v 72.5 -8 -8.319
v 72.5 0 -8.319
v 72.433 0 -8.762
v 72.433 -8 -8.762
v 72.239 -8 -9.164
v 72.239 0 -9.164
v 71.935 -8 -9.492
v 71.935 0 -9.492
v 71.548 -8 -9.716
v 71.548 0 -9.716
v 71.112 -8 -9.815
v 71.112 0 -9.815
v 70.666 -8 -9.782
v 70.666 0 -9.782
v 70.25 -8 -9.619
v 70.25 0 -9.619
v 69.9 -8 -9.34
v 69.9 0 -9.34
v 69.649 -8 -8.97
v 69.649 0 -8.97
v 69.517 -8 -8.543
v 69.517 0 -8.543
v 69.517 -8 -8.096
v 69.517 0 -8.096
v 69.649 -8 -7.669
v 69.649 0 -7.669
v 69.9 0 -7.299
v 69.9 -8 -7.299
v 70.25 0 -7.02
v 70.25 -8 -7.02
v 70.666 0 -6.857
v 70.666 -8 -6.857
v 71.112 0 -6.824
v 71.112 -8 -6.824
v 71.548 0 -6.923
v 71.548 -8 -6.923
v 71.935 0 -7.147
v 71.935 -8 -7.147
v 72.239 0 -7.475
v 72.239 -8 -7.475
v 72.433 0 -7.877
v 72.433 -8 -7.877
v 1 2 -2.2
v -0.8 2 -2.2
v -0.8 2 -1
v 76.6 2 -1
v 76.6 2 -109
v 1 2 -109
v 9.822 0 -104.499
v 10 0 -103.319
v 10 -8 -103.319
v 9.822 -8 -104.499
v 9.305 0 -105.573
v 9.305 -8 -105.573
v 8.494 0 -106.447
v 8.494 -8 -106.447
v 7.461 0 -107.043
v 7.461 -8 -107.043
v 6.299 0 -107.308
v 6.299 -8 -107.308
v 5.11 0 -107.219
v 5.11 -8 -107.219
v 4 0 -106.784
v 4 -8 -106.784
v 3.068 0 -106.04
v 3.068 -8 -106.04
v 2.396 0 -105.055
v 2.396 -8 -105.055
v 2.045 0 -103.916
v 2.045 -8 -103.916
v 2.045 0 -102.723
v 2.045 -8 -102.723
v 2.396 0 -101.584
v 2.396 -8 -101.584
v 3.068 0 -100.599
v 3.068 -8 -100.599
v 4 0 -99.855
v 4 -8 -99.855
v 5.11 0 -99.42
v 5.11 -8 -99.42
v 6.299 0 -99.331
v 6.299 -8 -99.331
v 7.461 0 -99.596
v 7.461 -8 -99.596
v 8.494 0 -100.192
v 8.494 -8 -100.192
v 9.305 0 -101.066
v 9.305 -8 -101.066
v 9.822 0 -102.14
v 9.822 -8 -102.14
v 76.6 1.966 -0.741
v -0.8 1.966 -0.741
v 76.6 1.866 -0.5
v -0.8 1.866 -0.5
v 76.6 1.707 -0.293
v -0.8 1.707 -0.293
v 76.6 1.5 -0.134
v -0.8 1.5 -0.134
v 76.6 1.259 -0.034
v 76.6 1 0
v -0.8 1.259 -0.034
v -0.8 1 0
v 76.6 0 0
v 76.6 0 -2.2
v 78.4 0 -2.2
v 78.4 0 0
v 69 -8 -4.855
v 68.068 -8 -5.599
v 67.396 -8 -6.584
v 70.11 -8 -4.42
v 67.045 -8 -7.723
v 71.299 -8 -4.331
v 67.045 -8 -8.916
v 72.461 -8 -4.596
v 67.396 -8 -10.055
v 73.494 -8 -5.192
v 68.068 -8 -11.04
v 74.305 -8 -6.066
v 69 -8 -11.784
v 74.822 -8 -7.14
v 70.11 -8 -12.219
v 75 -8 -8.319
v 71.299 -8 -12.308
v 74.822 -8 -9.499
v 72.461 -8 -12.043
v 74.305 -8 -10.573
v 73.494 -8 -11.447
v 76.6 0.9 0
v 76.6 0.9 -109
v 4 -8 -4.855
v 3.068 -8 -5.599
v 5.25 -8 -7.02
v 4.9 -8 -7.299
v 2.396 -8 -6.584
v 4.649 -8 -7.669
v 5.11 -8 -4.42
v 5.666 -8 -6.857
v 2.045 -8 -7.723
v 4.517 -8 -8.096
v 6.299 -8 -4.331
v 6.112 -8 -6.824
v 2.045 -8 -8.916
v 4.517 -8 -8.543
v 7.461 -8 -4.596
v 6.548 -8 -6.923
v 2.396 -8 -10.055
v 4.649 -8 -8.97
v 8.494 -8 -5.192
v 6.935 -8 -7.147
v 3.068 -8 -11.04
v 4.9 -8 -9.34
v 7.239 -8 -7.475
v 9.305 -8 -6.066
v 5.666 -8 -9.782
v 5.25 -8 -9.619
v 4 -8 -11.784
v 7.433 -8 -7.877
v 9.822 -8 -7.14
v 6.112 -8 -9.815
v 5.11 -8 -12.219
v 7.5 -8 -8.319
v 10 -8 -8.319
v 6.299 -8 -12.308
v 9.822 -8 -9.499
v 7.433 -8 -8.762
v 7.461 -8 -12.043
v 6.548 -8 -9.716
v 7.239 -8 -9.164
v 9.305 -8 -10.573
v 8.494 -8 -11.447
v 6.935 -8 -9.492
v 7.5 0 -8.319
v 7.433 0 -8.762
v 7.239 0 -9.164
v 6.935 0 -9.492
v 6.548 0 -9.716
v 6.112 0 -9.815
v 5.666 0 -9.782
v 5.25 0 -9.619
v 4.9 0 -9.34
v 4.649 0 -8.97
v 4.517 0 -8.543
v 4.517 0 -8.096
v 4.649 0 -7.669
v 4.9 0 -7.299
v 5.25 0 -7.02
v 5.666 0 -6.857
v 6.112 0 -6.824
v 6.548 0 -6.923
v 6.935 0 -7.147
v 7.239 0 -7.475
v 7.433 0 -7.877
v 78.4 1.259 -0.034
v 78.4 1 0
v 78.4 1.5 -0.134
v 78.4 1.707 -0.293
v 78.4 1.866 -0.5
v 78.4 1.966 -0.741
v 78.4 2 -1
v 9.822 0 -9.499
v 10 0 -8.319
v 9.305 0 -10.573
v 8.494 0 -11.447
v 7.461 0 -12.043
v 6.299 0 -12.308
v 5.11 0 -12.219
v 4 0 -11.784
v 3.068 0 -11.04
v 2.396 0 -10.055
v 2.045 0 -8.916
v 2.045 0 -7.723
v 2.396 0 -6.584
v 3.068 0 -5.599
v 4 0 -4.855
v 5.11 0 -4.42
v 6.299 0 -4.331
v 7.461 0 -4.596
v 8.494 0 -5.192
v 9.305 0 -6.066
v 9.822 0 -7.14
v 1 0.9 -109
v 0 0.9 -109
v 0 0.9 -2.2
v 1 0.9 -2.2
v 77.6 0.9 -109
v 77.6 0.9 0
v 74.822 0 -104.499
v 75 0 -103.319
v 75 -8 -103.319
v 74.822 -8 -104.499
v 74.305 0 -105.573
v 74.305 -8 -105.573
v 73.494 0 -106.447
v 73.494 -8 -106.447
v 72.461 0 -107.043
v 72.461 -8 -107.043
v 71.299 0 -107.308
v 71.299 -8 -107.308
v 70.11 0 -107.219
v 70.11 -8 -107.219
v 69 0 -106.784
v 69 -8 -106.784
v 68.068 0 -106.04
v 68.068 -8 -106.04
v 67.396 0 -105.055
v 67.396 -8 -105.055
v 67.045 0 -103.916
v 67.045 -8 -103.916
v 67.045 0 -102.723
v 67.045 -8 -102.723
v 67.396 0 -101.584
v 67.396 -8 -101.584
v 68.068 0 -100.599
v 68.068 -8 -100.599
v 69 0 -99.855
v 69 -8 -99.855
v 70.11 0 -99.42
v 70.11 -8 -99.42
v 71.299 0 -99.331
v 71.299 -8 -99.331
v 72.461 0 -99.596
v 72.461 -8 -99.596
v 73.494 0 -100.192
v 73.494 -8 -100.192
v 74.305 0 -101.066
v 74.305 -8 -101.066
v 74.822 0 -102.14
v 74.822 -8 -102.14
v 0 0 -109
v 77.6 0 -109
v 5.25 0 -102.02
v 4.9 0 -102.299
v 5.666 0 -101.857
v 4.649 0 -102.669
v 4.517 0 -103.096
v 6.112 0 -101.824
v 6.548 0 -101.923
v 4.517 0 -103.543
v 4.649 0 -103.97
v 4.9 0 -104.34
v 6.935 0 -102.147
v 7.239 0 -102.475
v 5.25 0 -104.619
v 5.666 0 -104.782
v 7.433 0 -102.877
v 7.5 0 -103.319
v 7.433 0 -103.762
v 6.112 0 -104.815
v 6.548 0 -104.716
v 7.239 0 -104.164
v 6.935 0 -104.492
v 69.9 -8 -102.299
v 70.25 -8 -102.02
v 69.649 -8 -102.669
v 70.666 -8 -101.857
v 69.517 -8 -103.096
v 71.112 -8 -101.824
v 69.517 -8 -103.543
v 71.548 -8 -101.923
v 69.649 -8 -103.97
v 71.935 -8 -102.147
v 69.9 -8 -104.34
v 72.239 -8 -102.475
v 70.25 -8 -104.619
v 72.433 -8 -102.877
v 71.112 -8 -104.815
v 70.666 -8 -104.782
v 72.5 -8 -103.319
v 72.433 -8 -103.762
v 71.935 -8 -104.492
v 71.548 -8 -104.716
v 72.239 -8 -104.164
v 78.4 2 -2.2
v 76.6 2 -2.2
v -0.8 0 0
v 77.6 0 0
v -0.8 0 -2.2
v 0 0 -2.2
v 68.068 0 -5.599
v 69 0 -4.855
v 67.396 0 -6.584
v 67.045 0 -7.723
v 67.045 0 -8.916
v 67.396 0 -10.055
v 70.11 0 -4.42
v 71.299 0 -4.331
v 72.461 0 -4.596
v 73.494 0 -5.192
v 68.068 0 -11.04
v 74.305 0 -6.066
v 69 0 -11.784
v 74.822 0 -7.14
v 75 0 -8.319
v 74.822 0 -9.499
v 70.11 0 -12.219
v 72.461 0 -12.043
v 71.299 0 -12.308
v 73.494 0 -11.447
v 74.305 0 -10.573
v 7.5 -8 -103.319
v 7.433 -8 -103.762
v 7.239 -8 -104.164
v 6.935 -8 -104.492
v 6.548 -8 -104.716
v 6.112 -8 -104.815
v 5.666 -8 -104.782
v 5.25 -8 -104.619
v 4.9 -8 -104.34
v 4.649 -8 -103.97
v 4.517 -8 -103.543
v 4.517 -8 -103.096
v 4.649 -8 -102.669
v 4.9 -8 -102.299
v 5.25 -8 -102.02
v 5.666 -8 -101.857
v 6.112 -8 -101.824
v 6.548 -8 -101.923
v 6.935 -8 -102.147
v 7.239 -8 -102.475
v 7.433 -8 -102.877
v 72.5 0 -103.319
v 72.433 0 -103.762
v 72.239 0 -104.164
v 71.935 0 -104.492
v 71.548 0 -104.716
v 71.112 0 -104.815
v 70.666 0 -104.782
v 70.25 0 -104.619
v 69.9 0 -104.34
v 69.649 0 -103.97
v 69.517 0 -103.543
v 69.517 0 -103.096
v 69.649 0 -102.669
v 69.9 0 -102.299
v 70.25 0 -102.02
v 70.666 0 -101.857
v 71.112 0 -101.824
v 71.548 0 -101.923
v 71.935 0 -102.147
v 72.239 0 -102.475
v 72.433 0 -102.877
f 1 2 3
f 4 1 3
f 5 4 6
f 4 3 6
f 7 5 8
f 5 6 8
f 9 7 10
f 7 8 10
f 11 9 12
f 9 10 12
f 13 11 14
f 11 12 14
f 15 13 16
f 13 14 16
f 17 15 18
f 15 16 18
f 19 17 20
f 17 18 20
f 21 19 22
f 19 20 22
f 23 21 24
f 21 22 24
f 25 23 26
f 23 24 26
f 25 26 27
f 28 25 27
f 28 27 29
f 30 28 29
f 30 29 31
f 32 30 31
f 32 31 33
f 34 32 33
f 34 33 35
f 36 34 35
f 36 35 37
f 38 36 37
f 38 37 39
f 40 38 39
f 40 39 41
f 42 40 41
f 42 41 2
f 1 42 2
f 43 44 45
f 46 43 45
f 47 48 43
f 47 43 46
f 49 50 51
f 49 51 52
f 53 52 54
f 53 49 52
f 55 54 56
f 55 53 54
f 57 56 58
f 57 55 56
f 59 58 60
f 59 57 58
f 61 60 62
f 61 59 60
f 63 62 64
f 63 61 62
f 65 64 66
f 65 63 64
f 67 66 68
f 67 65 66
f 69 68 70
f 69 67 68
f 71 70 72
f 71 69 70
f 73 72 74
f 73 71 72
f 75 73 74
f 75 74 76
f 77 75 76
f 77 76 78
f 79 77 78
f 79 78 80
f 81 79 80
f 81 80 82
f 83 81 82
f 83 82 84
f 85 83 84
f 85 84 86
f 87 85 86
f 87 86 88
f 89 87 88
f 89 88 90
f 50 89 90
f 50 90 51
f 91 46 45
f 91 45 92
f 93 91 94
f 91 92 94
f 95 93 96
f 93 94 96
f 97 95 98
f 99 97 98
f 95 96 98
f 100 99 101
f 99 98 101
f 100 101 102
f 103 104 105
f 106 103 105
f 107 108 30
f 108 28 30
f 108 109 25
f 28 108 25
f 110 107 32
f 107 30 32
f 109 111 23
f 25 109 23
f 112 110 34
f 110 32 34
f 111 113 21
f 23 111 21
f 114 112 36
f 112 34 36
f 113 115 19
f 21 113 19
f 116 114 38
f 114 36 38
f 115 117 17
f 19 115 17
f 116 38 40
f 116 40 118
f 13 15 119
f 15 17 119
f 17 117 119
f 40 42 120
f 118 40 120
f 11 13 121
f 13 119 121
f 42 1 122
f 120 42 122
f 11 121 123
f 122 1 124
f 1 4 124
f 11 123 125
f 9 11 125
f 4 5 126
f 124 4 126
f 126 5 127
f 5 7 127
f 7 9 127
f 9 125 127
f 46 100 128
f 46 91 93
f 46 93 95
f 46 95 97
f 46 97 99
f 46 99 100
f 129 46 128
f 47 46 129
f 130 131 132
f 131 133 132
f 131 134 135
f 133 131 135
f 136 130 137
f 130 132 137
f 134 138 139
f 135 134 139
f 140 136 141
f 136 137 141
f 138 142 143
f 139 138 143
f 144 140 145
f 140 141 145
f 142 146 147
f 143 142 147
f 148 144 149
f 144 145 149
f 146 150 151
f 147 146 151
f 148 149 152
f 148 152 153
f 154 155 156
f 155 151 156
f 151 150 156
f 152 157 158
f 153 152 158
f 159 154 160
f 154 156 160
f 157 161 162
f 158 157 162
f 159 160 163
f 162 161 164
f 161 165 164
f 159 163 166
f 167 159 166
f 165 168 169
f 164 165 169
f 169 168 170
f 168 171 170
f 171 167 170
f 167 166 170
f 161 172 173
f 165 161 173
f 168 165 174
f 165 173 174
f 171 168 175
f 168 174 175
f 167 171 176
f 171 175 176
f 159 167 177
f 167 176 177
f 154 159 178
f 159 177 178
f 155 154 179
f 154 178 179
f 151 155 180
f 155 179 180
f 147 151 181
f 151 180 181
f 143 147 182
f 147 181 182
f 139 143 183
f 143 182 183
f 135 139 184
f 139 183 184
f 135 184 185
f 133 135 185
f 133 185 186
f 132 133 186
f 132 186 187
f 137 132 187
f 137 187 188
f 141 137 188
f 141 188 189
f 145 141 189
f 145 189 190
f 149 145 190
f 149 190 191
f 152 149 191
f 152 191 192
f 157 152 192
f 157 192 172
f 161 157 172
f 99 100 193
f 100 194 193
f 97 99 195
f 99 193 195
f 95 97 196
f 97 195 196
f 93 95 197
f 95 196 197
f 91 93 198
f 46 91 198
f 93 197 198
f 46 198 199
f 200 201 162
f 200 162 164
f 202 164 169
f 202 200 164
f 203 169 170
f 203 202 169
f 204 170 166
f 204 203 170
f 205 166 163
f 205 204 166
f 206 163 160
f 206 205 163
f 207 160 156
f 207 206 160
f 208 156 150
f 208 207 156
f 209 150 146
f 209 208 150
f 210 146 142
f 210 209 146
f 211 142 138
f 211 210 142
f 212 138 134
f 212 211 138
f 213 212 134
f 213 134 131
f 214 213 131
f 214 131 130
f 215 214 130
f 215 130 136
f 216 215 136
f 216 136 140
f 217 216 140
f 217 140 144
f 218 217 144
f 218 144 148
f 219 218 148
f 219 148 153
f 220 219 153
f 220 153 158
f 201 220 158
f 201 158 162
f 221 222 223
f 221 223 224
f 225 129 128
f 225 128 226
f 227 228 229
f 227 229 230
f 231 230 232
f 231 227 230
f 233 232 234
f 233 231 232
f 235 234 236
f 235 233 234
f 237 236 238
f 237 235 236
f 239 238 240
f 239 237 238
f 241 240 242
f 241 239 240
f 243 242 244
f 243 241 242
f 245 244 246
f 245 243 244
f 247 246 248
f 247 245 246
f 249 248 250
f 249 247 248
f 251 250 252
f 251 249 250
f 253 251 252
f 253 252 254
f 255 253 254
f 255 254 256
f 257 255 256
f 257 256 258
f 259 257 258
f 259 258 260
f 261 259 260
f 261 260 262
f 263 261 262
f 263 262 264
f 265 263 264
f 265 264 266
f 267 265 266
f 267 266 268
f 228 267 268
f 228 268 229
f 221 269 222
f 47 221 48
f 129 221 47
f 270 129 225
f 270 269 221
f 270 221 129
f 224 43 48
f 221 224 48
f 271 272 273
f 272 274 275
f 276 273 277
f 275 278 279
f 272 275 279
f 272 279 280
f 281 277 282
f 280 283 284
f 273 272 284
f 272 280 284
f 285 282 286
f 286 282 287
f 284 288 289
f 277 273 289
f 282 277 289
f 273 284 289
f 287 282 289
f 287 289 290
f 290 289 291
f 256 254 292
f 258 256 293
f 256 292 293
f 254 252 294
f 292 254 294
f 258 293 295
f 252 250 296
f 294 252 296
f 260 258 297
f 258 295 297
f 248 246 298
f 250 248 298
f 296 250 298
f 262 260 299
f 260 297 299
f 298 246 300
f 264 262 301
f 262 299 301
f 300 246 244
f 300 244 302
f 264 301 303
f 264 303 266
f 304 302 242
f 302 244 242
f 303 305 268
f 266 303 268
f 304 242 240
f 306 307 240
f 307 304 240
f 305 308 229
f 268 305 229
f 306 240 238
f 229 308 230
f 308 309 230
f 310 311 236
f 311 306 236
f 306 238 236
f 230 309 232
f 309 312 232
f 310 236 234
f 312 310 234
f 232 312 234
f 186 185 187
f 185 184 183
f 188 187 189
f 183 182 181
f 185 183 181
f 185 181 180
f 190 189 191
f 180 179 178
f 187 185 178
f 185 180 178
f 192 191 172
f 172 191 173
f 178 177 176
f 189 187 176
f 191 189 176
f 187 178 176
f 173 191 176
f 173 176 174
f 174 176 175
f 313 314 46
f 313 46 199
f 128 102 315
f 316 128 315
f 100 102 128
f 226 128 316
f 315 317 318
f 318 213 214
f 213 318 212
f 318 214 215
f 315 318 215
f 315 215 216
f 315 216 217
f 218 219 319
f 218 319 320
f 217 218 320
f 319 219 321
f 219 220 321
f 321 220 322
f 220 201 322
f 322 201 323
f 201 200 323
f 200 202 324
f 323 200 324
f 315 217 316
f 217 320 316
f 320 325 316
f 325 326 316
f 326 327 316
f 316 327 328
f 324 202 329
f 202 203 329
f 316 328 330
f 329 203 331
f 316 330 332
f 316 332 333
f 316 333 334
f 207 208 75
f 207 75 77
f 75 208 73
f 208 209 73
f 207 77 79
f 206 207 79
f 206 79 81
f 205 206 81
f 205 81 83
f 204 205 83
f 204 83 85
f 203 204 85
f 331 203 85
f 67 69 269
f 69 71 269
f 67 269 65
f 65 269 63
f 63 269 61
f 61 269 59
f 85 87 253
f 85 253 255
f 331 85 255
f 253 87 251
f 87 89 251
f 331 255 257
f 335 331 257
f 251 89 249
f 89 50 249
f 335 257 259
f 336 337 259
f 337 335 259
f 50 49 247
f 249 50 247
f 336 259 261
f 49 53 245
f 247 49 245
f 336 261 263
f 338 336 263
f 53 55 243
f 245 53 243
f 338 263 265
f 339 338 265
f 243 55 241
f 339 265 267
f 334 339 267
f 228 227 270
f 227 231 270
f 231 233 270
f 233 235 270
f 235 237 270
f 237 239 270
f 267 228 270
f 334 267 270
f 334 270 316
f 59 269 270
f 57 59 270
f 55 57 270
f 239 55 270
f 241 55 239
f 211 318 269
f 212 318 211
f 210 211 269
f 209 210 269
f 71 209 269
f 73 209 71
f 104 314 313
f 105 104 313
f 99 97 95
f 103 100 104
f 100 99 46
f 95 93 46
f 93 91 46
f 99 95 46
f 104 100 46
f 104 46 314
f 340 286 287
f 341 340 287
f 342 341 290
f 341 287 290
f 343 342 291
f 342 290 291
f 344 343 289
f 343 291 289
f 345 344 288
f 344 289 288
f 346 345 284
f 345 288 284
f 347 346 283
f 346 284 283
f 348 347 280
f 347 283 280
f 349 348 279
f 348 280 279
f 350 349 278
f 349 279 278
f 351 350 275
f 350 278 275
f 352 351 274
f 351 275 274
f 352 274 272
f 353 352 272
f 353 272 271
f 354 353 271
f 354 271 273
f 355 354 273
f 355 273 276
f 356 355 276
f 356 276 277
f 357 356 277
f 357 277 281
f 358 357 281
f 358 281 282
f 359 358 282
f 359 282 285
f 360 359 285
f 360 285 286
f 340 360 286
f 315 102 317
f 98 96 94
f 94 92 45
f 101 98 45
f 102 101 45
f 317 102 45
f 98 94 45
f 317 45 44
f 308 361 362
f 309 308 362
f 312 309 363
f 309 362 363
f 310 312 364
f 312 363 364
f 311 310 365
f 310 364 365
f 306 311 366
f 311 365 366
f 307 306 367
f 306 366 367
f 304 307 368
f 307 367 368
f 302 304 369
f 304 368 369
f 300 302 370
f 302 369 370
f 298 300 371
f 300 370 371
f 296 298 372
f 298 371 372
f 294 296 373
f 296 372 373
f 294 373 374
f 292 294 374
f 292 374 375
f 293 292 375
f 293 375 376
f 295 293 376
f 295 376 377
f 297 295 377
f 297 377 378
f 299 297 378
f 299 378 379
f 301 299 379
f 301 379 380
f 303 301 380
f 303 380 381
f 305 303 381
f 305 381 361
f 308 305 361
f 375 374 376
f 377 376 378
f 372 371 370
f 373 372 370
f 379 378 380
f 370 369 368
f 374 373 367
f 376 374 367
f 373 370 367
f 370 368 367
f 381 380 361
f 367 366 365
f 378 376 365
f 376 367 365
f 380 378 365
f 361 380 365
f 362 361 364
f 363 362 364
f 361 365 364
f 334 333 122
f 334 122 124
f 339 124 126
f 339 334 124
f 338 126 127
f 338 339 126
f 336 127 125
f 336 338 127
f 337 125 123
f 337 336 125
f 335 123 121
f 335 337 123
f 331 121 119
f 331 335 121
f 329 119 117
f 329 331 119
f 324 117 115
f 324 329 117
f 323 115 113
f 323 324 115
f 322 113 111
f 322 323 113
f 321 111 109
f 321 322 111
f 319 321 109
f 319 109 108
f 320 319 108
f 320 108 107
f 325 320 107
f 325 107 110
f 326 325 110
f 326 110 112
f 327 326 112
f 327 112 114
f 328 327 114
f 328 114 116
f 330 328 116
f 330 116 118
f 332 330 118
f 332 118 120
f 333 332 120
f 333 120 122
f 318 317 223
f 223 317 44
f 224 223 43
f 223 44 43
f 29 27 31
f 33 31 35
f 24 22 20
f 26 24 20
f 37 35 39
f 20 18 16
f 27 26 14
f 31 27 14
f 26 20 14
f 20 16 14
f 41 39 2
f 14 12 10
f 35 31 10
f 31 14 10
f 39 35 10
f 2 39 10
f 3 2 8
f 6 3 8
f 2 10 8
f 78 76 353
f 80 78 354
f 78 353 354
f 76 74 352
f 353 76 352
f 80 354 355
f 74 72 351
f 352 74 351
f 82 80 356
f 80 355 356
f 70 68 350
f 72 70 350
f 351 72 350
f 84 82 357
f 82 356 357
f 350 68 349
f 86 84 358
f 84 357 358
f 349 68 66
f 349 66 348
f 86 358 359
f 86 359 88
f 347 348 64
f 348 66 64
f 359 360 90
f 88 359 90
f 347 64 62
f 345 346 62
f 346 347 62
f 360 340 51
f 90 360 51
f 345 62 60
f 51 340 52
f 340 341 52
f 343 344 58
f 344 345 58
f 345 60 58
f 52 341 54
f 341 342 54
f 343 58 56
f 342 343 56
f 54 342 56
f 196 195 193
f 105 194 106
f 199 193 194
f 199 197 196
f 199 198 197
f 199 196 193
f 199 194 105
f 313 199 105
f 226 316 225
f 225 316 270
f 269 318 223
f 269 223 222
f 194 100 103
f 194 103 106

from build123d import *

# Parameters (mm, degrees)
SKETCH1_W           = 77.6
SKETCH1_H           = 109
BOSS_EXTRUDE1_DEPTH = 2
SKETCH2_W           = 1
SKETCH2_H           = 109
CUT_EXTRUDE1_DEPTH  = 1.1
SKETCH3_R           = 4
SKETCH3_R_2         = 1.5
BOSS_EXTRUDE2_DEPTH = 10
SKETCH4_W           = 1.8
SKETCH4_H           = 2.2
BOSS_EXTRUDE3_DEPTH = 2
SKETCH5_W           = 1.8
SKETCH5_H           = 2.2
BOSS_EXTRUDE4_DEPTH = 2
FILLET1_R           = 1
FILLET2_R           = 1


with BuildPart() as part:
    # Sketch1 → Boss-Extrude1 (new body)
    with BuildSketch(Plane(origin=(0, 0, 0), x_dir=(1, 0, 0), z_dir=(0, 1, 0))):
        with Locations((38.8, 54.5)):
            Rectangle(SKETCH1_W, SKETCH1_H)
    extrude(amount=BOSS_EXTRUDE1_DEPTH)

    # Sketch2 → Cut-Extrude1 (cut)
    with BuildSketch(Plane(origin=(0, 2, 0), x_dir=(1, 0, 0), z_dir=(0, 1, 0))):
        with Locations((77.1, 54.5)):
            Rectangle(SKETCH2_W, SKETCH2_H)
        with Locations((0.5, 54.5)):
            Rectangle(SKETCH2_W, SKETCH2_H)
    extrude(amount=-CUT_EXTRUDE1_DEPTH, mode=Mode.SUBTRACT)

    # Sketch3 → Boss-Extrude2 (add)
    with BuildSketch(Plane(origin=(0, 2, 0), x_dir=(1, 0, 0), z_dir=(0, 1, 0))):
        with Locations((6, 103.319481559)):
            Circle(SKETCH3_R)
        with Locations((6, 103.319481559)):
            Circle(SKETCH3_R_2, mode=Mode.SUBTRACT)
        with Locations((6, 8.319481559)):
            Circle(SKETCH3_R)
        with Locations((6, 8.319481559)):
            Circle(SKETCH3_R_2, mode=Mode.SUBTRACT)
        with Locations((71, 8.319481559)):
            Circle(SKETCH3_R)
        with Locations((71, 8.319481559)):
            Circle(SKETCH3_R_2, mode=Mode.SUBTRACT)
        with Locations((71, 103.319481559)):
            Circle(SKETCH3_R)
        with Locations((71, 103.319481559)):
            Circle(SKETCH3_R_2, mode=Mode.SUBTRACT)
    extrude(amount=-BOSS_EXTRUDE2_DEPTH)

    # Sketch4 → Boss-Extrude3 (add)
    with BuildSketch(Plane(origin=(0, 2, 0), x_dir=(1, 0, 0), z_dir=(0, 1, 0))):
        with Locations((0.1, 1.1)):
            Rectangle(SKETCH4_W, SKETCH4_H)
    extrude(amount=-BOSS_EXTRUDE3_DEPTH)

    # Fillet1
    fillet1_edges = [part.edges().sort_by_distance(p)[0] for p in [
        (37.9, 2, 0),
    ]]
    fillet(fillet1_edges, radius=FILLET1_R)


with BuildPart() as body_2:
    # Sketch5 → Boss-Extrude4 (new body)
    with BuildSketch(Plane(origin=(0, 2, 0), x_dir=(1, 0, 0), z_dir=(0, 1, 0))):
        with Locations((77.5, 1.1)):
            Rectangle(SKETCH5_W, SKETCH5_H)
    extrude(amount=-BOSS_EXTRUDE4_DEPTH)

    # Fillet2
    fillet2_edges = [body_2.edges().sort_by_distance(p)[0] for p in [
        (77.5, 2, 0),
    ]]
    fillet(fillet2_edges, radius=FILLET2_R)


solid = Compound([part.part, body_2.part])
